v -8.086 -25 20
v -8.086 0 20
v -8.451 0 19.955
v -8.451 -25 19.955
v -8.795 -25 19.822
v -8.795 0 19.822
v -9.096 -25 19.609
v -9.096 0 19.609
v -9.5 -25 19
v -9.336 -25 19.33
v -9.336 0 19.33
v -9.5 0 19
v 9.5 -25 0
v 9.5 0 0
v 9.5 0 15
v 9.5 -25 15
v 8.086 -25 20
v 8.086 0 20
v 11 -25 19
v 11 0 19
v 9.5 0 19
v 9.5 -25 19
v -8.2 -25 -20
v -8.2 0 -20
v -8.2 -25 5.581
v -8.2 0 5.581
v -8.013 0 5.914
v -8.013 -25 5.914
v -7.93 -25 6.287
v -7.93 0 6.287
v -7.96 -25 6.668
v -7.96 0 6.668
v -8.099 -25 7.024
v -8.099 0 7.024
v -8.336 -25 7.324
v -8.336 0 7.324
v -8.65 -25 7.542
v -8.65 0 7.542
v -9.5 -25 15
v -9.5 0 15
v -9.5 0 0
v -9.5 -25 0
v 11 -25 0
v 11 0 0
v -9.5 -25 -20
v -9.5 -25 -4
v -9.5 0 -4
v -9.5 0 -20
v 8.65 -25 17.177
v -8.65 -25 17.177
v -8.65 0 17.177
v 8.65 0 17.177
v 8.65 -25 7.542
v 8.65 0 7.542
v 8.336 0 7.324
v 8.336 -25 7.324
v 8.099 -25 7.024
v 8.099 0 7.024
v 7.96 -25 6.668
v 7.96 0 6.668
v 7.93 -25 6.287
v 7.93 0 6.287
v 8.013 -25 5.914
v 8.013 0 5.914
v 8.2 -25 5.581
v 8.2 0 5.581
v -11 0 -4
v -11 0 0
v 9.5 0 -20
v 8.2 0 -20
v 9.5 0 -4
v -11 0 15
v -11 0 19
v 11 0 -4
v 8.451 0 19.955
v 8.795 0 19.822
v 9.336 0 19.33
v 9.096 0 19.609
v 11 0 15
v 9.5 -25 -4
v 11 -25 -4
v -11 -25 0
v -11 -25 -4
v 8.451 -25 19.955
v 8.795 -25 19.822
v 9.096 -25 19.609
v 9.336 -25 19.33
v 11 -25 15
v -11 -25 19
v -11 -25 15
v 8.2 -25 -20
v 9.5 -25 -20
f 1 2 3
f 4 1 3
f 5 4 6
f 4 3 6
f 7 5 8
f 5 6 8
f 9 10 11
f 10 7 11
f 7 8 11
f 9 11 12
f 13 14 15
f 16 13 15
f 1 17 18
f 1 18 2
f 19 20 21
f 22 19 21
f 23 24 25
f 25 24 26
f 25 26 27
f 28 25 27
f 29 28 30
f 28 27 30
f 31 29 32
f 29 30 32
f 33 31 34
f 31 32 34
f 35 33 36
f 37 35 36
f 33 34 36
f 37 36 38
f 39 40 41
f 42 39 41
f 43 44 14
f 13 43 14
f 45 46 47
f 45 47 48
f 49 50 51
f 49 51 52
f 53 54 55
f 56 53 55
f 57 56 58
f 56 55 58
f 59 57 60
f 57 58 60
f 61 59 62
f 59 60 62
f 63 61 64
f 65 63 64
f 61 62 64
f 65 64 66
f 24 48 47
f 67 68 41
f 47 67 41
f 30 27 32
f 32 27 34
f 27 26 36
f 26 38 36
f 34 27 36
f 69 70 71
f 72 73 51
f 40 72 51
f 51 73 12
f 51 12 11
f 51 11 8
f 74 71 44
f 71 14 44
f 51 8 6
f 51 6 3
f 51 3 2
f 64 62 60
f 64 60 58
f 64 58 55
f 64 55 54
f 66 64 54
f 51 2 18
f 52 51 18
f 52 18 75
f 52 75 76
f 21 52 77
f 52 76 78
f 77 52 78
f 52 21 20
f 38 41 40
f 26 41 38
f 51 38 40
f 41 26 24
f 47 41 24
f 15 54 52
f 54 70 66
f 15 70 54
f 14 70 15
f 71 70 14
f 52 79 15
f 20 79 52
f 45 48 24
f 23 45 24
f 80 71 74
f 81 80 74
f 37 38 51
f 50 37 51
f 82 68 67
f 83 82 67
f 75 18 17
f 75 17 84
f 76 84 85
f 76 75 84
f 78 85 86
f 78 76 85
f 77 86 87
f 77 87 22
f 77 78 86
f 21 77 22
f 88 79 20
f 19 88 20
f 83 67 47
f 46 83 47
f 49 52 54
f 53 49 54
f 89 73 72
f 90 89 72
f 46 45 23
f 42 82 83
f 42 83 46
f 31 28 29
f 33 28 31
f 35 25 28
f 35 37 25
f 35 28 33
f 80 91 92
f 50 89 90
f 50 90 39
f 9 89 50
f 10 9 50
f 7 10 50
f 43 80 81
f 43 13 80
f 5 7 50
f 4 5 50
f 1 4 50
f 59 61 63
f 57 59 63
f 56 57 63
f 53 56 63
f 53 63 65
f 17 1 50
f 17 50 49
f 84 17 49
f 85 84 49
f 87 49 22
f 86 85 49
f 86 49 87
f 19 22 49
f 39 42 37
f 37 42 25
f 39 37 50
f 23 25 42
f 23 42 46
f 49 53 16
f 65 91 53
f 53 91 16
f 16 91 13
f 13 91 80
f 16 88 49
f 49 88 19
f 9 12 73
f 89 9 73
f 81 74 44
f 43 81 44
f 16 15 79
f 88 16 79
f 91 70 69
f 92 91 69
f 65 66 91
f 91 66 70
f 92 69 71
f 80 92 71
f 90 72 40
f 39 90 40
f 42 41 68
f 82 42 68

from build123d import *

# Parameters (mm, degrees)
F1_DEPTH    = 25
F2_T1_DEPTH = 32.0710678119


# Not quite as in the source:
# - a fillet or chamfer that OpenCascade refuses, or shapes differently, is made with other operations: its cross-section is extruded or revolved along the edge and cut away or added


with BuildPart() as f1:
    # F0 (on Front) → F1 (new body)
    with BuildSketch(Plane.XZ):
        with BuildLine():
            Line((9.5, 20), (0, 20))
            Line((0, 20), (0, 17.1773286244))
            Line((0, 17.1773286244), (8.65, 17.1773286244))
            Line((8.65, 17.1773286244), (8.65, 7.5421757065))
            ThreePointArc((8.65, 7.5421757065), (7.9600869661, 6.6679955593), (8.2, 5.5805156007))
            Line((8.2, 5.5805156007), (8.2, -20))
            Line((8.2, -20), (9.5, -20))
            Line((9.5, -20), (9.5, -4))
            Line((9.5, -4), (11, -4))
            Line((11, -4), (11, 0))
            Line((11, 0), (9.5, 0))
            Line((9.5, 0), (9.5, 15))
            Line((9.5, 15), (11, 15))
            Line((11, 15), (11, 19))
            Line((11, 19), (9.5, 19))
            Line((9.5, 19), (9.5, 20))
        make_face()
        with BuildLine():
            Line((0, 17.1773286244), (0, 20))
            Line((0, 20), (-9.5, 20))
            Line((-9.5, 20), (-9.5, 19))
            Line((-9.5, 19), (-11, 19))
            Line((-11, 19), (-11, 15))
            Line((-11, 15), (-9.5, 15))
            Line((-9.5, 15), (-9.5, 0))
            Line((-9.5, 0), (-11, 0))
            Line((-11, 0), (-11, -4))
            Line((-11, -4), (-9.5, -4))
            Line((-9.5, -4), (-9.5, -20))
            Line((-9.5, -20), (-8.2, -20))
            Line((-8.2, -20), (-8.2, 5.5805156007))
            ThreePointArc((-8.2, 5.5805156007), (-7.9600869661, 6.6679955593), (-8.65, 7.5421757065))
            Line((-8.65, 7.5421757065), (-8.65, 17.1773286244))
            Line((-8.65, 17.1773286244), (0, 17.1773286244))
        make_face()
    extrude(amount=F1_DEPTH)

    # F2: fillet of radius 1.5 on 2 edges, made by hand

    # F2_s2 → F2_t1 (cut)
    with BuildSketch(Plane.XZ.offset(-3.5355339059)):
        with BuildLine():
            ThreePointArc((-8.0857864376, 20), (-8.9518118414, 19.7247448714), (-9.5, 19))
            Line((-9.5, 19), (-9.5, 20))
            Line((-9.5, 20), (-8.0857864376, 20))
        make_face()
        with BuildLine():
            ThreePointArc((8.0857864376, 20), (8.9518118414, 19.7247448714), (9.5, 19))
            Line((9.5, 19), (9.5, 20))
            Line((9.5, 20), (8.0857864376, 20))
        make_face()
    extrude(amount=F2_T1_DEPTH, mode=Mode.SUBTRACT)


solid = f1.part
